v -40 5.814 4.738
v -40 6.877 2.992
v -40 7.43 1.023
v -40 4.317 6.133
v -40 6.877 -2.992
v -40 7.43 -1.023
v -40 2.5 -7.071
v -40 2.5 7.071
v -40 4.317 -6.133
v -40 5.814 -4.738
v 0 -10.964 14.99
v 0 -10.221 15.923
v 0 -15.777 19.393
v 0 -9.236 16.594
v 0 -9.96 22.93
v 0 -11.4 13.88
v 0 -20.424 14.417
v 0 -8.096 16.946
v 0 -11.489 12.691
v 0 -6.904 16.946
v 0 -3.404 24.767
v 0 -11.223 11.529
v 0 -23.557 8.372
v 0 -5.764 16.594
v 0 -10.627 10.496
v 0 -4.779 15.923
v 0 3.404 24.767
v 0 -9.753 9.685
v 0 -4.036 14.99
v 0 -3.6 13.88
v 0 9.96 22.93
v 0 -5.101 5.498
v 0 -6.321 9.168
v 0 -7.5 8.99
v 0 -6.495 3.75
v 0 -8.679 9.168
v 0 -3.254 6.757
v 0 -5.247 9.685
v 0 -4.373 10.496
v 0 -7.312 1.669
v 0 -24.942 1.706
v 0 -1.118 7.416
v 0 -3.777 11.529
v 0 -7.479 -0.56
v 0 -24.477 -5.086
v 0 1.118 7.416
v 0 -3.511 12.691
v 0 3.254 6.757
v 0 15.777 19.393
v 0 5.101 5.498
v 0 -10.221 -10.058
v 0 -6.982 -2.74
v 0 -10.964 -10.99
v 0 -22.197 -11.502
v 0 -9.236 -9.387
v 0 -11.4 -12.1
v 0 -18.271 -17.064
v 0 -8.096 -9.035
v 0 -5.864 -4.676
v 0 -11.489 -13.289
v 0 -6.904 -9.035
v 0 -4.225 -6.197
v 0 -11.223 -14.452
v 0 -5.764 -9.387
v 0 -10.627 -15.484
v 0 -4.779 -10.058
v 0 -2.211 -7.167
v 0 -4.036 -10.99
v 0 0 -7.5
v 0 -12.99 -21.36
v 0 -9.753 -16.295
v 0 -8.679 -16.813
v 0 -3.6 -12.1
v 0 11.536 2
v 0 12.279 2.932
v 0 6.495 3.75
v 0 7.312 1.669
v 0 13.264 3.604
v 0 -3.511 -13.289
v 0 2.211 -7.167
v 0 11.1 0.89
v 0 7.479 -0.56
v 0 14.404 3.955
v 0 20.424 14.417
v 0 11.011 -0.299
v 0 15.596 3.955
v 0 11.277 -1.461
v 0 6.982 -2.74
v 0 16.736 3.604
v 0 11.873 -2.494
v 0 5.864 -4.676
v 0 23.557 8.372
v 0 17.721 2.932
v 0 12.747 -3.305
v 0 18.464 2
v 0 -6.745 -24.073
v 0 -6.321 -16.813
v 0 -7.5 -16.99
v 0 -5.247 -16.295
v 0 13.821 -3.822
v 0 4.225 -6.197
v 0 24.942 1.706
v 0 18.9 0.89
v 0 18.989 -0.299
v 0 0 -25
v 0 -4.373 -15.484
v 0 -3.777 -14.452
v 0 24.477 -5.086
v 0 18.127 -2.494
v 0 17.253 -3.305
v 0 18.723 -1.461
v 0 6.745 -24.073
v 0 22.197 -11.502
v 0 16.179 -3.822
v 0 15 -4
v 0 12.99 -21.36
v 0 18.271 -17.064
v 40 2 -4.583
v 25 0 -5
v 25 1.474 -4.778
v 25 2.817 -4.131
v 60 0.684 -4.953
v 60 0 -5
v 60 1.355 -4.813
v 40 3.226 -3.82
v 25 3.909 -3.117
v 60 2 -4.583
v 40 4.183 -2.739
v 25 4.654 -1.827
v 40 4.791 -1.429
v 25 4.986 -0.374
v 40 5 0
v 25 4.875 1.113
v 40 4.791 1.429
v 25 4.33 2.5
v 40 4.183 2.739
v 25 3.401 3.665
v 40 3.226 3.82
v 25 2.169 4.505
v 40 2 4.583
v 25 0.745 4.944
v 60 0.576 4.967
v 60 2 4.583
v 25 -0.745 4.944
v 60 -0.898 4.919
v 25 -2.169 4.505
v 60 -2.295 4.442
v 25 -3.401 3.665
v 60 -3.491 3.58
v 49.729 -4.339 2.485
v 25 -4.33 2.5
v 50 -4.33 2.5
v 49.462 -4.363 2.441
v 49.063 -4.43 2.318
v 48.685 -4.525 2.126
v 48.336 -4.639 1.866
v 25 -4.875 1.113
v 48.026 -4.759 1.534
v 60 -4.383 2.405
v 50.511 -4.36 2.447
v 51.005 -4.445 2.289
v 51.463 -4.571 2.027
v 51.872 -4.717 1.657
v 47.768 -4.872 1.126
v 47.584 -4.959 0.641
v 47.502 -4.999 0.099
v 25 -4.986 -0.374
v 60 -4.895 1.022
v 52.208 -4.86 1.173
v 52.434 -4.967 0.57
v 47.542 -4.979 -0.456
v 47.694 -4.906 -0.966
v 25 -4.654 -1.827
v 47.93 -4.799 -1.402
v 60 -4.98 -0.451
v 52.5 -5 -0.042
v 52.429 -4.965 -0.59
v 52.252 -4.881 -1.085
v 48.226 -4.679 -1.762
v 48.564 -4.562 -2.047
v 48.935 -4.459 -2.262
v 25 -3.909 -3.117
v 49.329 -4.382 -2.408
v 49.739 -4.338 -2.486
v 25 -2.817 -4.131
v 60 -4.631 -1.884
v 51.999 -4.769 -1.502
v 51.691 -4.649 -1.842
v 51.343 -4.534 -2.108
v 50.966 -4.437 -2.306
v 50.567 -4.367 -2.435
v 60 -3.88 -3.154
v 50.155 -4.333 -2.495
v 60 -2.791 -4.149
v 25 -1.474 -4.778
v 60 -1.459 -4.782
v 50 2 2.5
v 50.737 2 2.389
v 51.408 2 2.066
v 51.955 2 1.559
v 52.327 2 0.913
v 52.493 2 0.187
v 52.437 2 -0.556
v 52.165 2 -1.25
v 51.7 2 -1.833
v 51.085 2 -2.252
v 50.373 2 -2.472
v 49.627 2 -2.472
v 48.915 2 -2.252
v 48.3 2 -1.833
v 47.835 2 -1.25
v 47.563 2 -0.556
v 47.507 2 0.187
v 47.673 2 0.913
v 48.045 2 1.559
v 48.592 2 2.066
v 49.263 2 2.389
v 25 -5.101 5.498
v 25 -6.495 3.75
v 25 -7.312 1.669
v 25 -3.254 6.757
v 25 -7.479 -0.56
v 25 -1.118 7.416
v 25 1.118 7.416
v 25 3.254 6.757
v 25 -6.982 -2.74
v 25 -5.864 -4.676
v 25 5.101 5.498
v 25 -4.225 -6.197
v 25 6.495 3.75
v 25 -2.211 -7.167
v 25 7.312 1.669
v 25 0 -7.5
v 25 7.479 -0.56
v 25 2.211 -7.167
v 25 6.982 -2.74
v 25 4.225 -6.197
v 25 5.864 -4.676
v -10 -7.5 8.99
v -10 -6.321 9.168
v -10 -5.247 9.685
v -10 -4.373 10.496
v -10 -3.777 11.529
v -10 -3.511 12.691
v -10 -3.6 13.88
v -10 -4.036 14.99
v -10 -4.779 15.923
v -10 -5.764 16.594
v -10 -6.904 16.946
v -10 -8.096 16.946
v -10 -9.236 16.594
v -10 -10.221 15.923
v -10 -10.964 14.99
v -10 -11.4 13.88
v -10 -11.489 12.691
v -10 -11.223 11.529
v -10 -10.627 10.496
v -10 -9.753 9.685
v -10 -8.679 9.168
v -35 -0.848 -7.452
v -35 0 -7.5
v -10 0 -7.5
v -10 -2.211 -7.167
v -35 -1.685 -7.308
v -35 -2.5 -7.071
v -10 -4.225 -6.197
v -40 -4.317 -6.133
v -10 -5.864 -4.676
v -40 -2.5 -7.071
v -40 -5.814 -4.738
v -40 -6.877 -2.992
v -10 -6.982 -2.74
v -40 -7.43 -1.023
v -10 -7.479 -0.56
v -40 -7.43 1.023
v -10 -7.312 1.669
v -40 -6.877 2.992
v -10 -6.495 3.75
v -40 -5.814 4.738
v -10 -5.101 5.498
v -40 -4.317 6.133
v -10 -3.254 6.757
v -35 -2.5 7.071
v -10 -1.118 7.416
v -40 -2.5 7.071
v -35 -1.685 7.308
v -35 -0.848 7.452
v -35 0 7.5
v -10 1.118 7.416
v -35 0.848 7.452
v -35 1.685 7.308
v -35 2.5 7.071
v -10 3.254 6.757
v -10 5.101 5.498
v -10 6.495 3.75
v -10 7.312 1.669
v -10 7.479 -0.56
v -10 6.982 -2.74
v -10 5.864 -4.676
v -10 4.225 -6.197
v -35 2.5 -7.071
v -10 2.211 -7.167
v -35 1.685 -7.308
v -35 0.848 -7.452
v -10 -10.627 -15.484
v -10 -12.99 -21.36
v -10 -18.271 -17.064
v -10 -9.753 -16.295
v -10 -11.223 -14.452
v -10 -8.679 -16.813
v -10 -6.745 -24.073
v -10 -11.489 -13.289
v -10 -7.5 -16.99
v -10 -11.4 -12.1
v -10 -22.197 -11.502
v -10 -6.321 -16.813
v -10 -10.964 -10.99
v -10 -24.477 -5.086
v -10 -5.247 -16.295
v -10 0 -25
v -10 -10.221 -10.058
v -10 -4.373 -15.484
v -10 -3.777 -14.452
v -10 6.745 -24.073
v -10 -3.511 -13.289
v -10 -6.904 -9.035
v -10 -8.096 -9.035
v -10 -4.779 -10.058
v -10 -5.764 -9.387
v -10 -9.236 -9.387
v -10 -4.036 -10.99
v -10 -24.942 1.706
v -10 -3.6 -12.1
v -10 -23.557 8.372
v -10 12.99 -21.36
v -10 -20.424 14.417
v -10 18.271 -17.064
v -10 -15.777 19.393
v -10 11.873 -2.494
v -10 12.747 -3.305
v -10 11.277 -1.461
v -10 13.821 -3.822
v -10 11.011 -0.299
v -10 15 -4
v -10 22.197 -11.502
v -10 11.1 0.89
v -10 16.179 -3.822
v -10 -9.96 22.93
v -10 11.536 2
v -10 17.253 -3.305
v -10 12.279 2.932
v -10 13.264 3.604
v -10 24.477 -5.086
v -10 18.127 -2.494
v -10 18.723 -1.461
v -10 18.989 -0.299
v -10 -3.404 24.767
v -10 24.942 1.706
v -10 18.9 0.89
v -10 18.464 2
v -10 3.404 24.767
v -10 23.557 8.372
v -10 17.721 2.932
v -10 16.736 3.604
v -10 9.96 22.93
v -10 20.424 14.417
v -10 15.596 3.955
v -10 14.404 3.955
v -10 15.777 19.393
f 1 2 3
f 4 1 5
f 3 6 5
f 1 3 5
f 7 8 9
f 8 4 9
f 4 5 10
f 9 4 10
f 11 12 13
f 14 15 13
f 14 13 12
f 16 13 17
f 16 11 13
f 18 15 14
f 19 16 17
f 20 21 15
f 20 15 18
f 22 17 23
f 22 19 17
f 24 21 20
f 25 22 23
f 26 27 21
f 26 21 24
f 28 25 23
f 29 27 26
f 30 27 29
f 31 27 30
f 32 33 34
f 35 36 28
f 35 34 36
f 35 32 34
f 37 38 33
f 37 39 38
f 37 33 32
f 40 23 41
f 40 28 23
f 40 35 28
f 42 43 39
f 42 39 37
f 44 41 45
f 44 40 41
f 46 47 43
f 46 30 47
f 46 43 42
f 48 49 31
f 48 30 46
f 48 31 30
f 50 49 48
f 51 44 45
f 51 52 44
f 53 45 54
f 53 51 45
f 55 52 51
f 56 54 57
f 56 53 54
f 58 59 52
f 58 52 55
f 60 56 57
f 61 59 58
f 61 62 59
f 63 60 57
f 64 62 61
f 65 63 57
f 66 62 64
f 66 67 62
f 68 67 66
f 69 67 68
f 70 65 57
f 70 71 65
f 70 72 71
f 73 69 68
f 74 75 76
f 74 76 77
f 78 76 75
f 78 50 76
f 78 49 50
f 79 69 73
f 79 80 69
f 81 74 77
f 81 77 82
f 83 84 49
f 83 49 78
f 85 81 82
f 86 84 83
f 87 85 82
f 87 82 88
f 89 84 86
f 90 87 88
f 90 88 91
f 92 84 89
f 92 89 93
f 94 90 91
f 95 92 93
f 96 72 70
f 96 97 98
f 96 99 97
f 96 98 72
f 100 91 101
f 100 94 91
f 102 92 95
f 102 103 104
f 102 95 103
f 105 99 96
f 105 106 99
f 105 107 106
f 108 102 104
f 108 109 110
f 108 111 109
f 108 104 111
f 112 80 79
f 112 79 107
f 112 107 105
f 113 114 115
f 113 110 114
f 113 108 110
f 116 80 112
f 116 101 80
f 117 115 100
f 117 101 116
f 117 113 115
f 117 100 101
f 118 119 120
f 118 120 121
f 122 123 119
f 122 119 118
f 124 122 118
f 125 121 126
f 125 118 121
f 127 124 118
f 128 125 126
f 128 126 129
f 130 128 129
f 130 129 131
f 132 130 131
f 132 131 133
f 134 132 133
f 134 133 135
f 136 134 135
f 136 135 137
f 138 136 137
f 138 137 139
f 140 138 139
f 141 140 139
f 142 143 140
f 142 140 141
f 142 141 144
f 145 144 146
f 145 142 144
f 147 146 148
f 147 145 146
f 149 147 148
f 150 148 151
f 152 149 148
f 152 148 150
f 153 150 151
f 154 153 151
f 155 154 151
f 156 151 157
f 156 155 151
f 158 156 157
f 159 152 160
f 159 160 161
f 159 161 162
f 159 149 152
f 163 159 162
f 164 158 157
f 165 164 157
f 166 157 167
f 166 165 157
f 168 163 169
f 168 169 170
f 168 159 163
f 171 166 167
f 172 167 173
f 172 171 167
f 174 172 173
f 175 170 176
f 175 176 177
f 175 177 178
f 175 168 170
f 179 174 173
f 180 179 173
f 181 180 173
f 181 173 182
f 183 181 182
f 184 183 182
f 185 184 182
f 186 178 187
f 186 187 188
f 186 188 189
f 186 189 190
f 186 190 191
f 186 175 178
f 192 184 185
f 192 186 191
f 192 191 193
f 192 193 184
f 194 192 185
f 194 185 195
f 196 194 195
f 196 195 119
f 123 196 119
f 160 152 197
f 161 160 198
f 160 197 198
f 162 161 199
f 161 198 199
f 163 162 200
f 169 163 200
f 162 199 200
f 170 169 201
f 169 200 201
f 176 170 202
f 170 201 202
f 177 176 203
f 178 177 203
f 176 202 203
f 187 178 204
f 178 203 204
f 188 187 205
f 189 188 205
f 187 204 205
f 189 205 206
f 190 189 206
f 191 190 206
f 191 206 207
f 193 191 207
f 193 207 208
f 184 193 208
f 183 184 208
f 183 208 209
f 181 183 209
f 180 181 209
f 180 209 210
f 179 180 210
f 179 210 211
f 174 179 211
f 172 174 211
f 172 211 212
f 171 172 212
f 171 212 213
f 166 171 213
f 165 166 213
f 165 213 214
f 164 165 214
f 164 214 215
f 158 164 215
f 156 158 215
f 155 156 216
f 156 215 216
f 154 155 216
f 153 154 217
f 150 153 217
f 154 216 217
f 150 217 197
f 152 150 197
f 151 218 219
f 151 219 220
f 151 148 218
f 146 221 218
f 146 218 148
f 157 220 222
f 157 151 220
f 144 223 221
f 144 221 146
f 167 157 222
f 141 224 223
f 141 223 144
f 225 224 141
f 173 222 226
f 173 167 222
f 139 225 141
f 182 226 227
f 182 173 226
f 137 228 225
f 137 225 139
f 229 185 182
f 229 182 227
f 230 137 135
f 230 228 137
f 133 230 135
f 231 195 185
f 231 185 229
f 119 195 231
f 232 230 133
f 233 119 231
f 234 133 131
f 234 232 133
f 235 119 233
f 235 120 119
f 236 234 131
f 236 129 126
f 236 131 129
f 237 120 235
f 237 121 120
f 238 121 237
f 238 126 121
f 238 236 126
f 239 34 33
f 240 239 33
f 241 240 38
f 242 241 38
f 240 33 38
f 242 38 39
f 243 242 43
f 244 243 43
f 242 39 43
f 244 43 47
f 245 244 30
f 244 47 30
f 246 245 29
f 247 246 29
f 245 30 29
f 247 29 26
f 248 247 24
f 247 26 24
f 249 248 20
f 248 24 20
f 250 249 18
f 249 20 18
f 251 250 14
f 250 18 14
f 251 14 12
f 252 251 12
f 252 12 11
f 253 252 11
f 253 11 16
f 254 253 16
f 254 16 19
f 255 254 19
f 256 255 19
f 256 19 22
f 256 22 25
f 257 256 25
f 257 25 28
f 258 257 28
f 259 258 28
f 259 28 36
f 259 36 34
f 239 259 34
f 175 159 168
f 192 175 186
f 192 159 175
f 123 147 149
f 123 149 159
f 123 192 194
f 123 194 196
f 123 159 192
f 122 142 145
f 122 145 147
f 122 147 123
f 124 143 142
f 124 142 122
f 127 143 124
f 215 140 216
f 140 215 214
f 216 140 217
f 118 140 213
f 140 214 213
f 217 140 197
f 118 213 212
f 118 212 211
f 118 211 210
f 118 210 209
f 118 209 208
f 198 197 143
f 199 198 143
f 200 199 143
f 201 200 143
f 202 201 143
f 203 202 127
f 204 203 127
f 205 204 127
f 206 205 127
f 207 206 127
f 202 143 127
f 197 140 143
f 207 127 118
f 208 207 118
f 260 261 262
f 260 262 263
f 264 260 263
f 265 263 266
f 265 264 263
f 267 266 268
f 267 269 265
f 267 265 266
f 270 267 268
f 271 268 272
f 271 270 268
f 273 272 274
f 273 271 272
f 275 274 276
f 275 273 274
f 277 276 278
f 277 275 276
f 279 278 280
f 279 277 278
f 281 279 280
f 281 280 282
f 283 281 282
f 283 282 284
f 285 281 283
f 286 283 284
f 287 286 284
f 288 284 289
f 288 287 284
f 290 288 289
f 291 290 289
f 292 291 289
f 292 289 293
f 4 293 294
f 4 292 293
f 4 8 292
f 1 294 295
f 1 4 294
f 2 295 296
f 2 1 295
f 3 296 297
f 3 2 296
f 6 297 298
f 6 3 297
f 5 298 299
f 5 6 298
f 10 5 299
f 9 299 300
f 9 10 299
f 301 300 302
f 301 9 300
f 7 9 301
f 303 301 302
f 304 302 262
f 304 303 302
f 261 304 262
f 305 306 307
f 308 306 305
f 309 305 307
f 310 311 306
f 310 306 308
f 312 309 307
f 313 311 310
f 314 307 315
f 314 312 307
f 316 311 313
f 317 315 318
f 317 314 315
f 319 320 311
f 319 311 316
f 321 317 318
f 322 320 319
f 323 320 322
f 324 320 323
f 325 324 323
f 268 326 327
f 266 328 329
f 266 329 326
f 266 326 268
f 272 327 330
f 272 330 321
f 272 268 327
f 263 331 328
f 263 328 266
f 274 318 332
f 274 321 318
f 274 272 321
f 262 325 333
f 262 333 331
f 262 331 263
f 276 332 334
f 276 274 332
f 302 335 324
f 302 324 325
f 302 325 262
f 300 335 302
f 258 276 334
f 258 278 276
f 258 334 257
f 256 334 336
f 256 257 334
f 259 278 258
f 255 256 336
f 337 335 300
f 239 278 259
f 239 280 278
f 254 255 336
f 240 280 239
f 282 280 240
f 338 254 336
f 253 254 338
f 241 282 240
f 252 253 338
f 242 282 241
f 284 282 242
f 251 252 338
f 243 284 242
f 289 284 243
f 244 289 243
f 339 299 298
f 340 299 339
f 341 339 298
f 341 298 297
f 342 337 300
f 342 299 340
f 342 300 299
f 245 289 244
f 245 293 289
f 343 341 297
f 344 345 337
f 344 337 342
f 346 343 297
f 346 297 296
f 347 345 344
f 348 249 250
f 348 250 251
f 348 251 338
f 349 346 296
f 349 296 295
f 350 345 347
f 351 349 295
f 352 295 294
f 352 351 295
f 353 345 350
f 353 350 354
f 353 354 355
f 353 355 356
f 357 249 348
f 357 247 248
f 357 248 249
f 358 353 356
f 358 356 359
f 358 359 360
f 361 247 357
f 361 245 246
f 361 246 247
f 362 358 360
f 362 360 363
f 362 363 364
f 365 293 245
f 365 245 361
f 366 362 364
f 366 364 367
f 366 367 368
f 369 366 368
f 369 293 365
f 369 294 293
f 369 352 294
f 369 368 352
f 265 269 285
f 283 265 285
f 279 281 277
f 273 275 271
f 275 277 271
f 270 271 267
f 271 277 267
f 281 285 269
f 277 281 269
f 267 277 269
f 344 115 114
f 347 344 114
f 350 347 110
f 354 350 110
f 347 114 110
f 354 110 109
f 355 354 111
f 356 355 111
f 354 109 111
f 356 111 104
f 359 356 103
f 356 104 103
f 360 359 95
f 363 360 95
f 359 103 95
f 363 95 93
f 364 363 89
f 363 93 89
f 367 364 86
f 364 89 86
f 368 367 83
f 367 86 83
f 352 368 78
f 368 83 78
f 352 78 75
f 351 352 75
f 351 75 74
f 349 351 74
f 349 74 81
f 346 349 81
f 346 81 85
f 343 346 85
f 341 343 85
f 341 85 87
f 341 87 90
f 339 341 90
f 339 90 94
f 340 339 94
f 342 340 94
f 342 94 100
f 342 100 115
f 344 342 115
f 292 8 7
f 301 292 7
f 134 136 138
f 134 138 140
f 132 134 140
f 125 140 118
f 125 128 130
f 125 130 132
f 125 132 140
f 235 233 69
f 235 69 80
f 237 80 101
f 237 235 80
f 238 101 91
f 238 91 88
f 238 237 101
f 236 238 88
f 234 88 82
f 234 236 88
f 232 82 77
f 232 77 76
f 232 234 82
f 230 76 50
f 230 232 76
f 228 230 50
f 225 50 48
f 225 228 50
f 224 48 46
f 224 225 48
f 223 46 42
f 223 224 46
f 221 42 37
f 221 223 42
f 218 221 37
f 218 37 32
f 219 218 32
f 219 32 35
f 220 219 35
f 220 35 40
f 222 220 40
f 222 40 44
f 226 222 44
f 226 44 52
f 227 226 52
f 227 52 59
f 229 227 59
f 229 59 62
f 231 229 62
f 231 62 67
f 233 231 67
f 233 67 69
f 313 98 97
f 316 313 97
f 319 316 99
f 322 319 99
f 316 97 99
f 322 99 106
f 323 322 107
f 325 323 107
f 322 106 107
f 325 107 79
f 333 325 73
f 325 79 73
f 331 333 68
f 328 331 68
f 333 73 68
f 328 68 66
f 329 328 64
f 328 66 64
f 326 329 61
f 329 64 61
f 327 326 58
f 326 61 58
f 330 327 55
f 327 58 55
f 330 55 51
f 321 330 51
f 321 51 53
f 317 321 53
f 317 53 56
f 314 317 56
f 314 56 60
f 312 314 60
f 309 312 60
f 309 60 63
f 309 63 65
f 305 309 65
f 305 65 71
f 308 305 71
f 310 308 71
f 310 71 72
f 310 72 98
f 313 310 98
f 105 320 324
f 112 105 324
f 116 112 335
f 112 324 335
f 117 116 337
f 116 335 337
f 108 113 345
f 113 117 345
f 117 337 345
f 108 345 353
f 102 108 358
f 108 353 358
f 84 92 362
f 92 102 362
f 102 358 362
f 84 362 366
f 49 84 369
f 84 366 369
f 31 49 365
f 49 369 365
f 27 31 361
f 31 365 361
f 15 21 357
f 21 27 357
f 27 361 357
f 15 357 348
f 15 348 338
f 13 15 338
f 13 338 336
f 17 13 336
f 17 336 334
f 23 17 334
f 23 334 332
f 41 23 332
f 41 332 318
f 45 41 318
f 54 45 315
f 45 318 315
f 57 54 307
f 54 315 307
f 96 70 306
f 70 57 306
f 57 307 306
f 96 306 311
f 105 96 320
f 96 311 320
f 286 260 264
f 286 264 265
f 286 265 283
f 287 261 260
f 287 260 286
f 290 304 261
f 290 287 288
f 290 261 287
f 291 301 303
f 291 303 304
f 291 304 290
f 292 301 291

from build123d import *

# Parameters (mm, degrees)
BOSS_EXTRUDE3_DEPTH      = 60
BOSS_EXTRUDE3_DEPTH_BACK = 40
SKETCH1_R                = 25
SKETCH2_OUTSIDE_W        = 76.494
SKETCH2_OUTSIDE_H        = 76.494
SKETCH2_OUTSIDE_R        = 7.5
CUT_EXTRUDE3_DEPTH       = 60
SKETCH4_OUTSIDE_W        = 76.494
SKETCH4_OUTSIDE_H        = 76.494
SKETCH4_OUTSIDE_R        = 7.5
CUT_EXTRUDE4_DEPTH       = 30
SKETCH5_OUTSIDE_W        = 76.494
SKETCH5_OUTSIDE_H        = 76.494
SKETCH5_OUTSIDE_R        = 5
CUT_EXTRUDE5_DEPTH       = 35
CUT_EXTRUDE6_DEPTH       = 20
SKETCH7_R                = 2.5
CUT_EXTRUDE7_DEPTH       = 71.384657419
SKETCH8_R                = 4
CUT_EXTRUDE8_DEPTH       = 20
CUT_EXTRUDE10_DEPTH      = 5


with BuildPart() as part:
    # Sketch1 → Boss-Extrude3 (new, two sides: drawn at the far end of the back side and taken through both)
    with BuildSketch(Plane(origin=(0, 0, 0), x_dir=(0, 0, -1), z_dir=(1, 0, 0)).offset(-BOSS_EXTRUDE3_DEPTH_BACK)):
        Circle(SKETCH1_R)
    extrude(amount=BOSS_EXTRUDE3_DEPTH + BOSS_EXTRUDE3_DEPTH_BACK)

    # Sketch2 outside → Cut-Extrude3 (cut)
    with BuildSketch(Plane(origin=(60, 0, 0), x_dir=(0, 0, -1), z_dir=(1, 0, 0))):
        Rectangle(SKETCH2_OUTSIDE_W, SKETCH2_OUTSIDE_H)
        Circle(SKETCH2_OUTSIDE_R, mode=Mode.SUBTRACT)
    extrude(amount=-CUT_EXTRUDE3_DEPTH, mode=Mode.SUBTRACT)

    # Sketch4 outside → Cut-Extrude4 (cut)
    with BuildSketch(Plane.ZY.offset(40)):
        Rectangle(SKETCH4_OUTSIDE_W, SKETCH4_OUTSIDE_H)
        with Locations(Location((0, 0, 0), (0, 0, 180))):
            Circle(SKETCH4_OUTSIDE_R, mode=Mode.SUBTRACT)
    extrude(amount=-CUT_EXTRUDE4_DEPTH, mode=Mode.SUBTRACT)

    # Sketch5 outside → Cut-Extrude5 (cut)
    with BuildSketch(Plane(origin=(60, 0, 0), x_dir=(0, 0, -1), z_dir=(1, 0, 0))):
        Rectangle(SKETCH5_OUTSIDE_W, SKETCH5_OUTSIDE_H)
        Circle(SKETCH5_OUTSIDE_R, mode=Mode.SUBTRACT)
    extrude(amount=-CUT_EXTRUDE5_DEPTH, mode=Mode.SUBTRACT)

    # Sketch6 → Cut-Extrude6 (cut)
    with BuildSketch(Plane(origin=(60, 0, 0), x_dir=(0, 0, -1), z_dir=(1, 0, 0))):
        with BuildLine():
            Line((-4.582575695, 2), (4.582575695, 2))
            ThreePointArc((4.582575695, 2), (0, 5), (-4.582575695, 2))
        make_face()
    extrude(amount=-CUT_EXTRUDE6_DEPTH, mode=Mode.SUBTRACT)

    # Sketch7 → Cut-Extrude7 (cut, through all)
    with BuildSketch(Plane(origin=(0, 2, 0), x_dir=(1, 0, 0), z_dir=(0, 1, 0))):
        with Locations(Location((50, 0, 0), (0, 0, 270))):
            Circle(SKETCH7_R)
    extrude(amount=-CUT_EXTRUDE7_DEPTH, mode=Mode.SUBTRACT)

    # Sketch8 → Cut-Extrude8 (cut)
    with BuildSketch(Plane(origin=(0, 0, 0), x_dir=(0, 0, -1), z_dir=(1, 0, 0))):
        with Locations((0, 15)):
            Circle(SKETCH8_R)
        with Locations((12.990381057, -7.5)):
            Circle(SKETCH8_R)
        with Locations((-12.990381057, -7.5)):
            Circle(SKETCH8_R)
    extrude(amount=-CUT_EXTRUDE8_DEPTH, mode=Mode.SUBTRACT)

    # Sketch11 → Cut-Extrude10 (cut)
    with BuildSketch(Plane.ZY.offset(40)):
        with BuildLine():
            Line((7.071067812, 2.5), (-7.071067812, 2.5))
            ThreePointArc((-7.071067812, 2.5), (-7.5, 0), (-7.071067812, -2.5))
            Line((-7.071067812, -2.5), (7.071067812, -2.5))
            ThreePointArc((7.071067812, -2.5), (7.391989197, -1.26826484), (7.5, 0))
            ThreePointArc((7.5, 0), (7.391989197, 1.26826484), (7.071067812, 2.5))
        make_face()
    extrude(amount=-CUT_EXTRUDE10_DEPTH, mode=Mode.SUBTRACT)


solid = part.part
